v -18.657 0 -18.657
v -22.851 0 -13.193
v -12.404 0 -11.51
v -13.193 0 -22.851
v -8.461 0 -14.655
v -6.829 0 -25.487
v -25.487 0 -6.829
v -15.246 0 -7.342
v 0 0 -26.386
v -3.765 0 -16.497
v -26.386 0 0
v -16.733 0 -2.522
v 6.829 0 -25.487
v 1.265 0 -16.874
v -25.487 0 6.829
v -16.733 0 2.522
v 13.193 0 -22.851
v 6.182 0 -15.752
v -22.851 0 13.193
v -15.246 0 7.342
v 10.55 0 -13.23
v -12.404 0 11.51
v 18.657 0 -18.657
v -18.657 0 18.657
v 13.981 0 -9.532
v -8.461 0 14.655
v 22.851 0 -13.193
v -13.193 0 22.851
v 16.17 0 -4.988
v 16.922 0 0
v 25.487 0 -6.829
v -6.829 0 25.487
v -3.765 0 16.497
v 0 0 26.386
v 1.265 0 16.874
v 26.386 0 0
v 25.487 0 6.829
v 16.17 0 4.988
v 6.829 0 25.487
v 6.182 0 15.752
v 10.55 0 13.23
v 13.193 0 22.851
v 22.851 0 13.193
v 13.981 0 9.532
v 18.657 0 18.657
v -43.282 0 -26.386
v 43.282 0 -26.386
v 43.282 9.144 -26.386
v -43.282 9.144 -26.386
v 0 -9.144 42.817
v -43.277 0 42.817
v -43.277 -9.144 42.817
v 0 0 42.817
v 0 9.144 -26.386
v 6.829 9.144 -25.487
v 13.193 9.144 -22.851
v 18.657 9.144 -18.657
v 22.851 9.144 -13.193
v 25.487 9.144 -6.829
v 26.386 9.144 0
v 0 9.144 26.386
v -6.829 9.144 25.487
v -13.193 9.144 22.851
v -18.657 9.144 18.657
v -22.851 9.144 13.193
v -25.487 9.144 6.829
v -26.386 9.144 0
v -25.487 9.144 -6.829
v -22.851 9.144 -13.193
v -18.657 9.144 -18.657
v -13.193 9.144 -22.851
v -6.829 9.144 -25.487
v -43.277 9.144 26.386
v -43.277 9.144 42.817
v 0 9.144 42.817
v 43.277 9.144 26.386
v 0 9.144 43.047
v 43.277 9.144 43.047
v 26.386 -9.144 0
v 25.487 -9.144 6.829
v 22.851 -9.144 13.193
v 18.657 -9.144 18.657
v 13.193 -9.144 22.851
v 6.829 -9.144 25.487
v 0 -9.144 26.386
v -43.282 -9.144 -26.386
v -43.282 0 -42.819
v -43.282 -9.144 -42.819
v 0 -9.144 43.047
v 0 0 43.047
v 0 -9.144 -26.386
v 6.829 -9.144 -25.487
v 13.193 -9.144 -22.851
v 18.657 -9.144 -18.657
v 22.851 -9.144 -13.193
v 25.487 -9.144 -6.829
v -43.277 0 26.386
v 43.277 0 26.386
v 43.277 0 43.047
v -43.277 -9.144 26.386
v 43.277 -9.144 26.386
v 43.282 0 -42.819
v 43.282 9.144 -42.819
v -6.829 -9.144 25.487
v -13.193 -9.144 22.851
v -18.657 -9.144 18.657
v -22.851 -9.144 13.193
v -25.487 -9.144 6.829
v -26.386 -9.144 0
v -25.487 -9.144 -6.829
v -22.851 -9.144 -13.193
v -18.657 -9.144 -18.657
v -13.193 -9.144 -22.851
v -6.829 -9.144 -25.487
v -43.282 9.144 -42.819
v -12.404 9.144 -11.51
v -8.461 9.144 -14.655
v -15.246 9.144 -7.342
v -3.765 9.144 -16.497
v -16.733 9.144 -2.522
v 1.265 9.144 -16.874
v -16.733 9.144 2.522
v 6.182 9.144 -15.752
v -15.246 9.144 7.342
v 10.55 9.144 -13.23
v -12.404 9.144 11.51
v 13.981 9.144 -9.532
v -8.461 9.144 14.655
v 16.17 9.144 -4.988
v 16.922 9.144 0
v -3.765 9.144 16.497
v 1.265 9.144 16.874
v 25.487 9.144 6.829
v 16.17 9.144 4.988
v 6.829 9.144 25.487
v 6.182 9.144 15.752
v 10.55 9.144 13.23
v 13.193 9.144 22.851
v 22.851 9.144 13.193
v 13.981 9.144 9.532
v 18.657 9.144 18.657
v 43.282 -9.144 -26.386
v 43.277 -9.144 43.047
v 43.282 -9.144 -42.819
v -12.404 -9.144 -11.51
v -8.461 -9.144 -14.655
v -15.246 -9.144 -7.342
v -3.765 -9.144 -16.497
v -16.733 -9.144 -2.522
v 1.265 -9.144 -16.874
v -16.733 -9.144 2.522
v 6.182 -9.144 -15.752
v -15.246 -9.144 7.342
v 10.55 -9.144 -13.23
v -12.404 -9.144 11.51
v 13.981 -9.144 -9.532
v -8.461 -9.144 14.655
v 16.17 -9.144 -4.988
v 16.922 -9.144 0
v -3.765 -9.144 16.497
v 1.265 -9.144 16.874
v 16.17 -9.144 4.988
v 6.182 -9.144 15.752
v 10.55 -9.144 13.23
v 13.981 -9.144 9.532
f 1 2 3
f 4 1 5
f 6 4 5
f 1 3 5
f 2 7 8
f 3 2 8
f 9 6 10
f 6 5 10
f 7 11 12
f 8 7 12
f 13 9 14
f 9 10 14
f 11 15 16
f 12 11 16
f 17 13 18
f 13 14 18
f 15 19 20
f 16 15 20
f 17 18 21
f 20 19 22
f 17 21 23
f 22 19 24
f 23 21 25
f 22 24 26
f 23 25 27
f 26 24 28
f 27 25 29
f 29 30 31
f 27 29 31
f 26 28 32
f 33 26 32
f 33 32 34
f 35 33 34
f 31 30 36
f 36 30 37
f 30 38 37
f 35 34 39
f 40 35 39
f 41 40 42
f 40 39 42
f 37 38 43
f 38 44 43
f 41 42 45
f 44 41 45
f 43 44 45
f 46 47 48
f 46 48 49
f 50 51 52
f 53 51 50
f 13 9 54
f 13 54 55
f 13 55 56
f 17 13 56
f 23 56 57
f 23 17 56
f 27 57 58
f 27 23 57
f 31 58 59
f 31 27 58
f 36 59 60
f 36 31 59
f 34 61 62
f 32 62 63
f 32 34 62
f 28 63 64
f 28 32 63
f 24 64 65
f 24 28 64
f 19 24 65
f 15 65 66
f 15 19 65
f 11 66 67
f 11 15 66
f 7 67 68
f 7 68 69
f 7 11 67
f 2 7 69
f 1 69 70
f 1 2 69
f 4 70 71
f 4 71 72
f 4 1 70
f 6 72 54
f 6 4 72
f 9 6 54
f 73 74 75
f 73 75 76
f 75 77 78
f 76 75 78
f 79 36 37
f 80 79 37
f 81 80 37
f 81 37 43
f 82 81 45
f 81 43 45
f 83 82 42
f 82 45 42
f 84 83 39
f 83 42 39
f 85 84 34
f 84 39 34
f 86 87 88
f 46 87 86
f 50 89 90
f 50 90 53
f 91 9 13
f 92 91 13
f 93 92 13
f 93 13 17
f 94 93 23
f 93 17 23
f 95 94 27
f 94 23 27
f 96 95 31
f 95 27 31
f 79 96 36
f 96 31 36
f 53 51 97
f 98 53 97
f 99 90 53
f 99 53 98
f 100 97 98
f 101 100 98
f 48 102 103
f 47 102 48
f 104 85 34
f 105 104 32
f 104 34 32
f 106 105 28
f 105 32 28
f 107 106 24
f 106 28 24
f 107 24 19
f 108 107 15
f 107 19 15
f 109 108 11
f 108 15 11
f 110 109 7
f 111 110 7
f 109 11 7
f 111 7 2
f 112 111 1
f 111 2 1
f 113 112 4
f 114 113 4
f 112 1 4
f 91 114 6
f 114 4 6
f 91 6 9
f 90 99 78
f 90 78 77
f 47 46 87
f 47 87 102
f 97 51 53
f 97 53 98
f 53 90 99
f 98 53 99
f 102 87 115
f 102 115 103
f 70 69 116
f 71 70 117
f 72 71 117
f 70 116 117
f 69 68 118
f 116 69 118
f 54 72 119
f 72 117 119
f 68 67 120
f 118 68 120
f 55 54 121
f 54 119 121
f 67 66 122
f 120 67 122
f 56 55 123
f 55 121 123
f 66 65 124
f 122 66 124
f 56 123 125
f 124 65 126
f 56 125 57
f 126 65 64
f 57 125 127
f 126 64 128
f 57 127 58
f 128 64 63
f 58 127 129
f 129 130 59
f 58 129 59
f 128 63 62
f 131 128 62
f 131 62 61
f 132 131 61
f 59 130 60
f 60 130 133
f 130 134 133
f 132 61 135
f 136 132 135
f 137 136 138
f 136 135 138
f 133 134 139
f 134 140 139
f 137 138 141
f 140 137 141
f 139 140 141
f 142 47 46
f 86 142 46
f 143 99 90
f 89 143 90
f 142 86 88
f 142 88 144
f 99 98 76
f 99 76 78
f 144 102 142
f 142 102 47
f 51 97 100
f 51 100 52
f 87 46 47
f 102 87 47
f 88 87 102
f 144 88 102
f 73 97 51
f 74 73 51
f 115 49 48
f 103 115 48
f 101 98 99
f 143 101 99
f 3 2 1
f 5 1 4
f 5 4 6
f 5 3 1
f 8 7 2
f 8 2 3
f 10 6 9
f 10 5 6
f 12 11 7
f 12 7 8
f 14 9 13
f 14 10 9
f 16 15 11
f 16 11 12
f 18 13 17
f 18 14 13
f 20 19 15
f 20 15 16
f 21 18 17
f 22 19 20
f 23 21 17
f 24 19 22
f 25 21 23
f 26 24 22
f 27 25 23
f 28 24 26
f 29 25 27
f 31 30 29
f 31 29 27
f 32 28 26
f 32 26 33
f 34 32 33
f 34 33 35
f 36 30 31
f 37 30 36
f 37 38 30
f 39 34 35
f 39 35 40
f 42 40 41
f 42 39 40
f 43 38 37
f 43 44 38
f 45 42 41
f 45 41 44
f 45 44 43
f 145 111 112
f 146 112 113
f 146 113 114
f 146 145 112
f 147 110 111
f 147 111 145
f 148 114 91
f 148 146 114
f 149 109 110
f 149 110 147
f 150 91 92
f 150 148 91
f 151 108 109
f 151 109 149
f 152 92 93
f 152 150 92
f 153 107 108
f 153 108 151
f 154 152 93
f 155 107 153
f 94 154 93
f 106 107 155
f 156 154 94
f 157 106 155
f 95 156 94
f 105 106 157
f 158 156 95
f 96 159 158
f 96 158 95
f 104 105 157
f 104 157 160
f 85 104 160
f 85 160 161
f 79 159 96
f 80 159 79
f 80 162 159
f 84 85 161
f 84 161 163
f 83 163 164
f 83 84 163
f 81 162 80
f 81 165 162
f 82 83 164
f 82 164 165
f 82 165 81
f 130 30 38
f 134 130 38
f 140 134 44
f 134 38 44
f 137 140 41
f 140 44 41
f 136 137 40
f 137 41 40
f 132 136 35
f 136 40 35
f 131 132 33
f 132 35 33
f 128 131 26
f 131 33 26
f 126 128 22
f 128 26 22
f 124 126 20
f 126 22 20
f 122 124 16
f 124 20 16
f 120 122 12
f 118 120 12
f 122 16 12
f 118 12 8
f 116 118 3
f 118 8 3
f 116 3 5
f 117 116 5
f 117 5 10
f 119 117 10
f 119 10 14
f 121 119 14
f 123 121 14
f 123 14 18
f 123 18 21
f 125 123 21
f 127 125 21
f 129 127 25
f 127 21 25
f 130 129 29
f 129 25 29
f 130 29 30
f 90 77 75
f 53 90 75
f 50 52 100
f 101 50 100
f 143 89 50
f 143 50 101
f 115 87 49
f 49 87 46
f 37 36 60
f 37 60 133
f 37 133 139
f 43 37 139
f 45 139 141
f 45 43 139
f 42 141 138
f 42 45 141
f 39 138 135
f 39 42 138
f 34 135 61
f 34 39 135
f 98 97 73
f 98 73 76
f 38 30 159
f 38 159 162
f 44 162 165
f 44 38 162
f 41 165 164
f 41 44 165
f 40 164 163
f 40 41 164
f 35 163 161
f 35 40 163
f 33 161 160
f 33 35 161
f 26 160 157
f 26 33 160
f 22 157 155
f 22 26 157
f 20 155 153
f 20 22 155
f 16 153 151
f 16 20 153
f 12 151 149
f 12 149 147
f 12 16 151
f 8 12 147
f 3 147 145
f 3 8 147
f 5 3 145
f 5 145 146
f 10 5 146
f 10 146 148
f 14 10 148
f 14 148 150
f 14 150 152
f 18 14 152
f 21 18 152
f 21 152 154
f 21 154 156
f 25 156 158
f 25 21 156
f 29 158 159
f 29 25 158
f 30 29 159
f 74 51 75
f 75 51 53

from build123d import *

# Parameters (mm, degrees)
F0_R     = 16.9215961021
F1_DEPTH = 9.144
F0_W     = 43.2765670121
F0_H     = 16.4317270167
F0_W_2   = 43.2816
F0_H_2   = 16.4338
F2_DEPTH = 9.144


with BuildPart() as f1:
    # F0 (on Front) → F1 (new body)
    with BuildSketch(Plane.XZ):
        with BuildLine():
            ThreePointArc((0, -26.3856756144), (18.6574901531, -18.6574901531), (26.3856756144, 0))
            ThreePointArc((26.3856756144, 0), (18.6574901531, 18.6574901531), (0, 26.3856756144))
            ThreePointArc((0, 26.3856756144), (-26.3856756144, 0), (0, -26.3856756144))
        make_face()
        Circle(F0_R, mode=Mode.SUBTRACT)
    extrude(amount=F1_DEPTH)


with BuildPart() as f1b:
    # F0 (on Front) → F1, piece 2 (new body)
    with BuildSketch(Plane.XZ):
        with Locations((-21.638283506, 34.6015391227)):
            Rectangle(F0_W, F0_H)
        Polygon((0, 42.817402631), (0, 26.3856756144), (43.2765781879, 26.3856756144), (43.2765781879, 43.0469885468), (0, 43.0469885468), align=None)
    extrude(amount=F1_DEPTH)


with BuildPart() as f1c:
    # F0 (on Front) → F1, piece 3 (new body)
    with BuildSketch(Plane.XZ):
        with Locations((-21.6408, -34.6025756144)):
            Rectangle(F0_W_2, F0_H_2)
        with Locations((21.6408, -34.6025756144)):
            Rectangle(F0_W_2, F0_H_2)
    extrude(amount=F1_DEPTH)


with BuildPart() as f2:
    # F2 (new): a face of the model
    f2_faces = [f1.part.faces().sort_by_distance(p)[0] for p in [
        (-25.6393760083, 0, 0),
    ]]
    extrude(f2_faces, amount=F2_DEPTH)


with BuildPart() as f2b:
    # F2#2 (new): a face of the model
    f2_2_faces = [f1c.part.faces().sort_by_distance(p)[0] for p in [
        (0, 0, -34.6025756144),
    ]]
    extrude(f2_2_faces, amount=F2_DEPTH)


with BuildPart() as f2c:
    # F2#3 (new): a face of the model
    f2_3_faces = [f1b.part.faces().sort_by_distance(p)[0] for p in [
        (0.1501231287, 0, 34.6593338023),
    ]]
    extrude(f2_3_faces, amount=F2_DEPTH)


solid = Compound([f1.part, f1b.part, f1c.part, f2.part, f2b.part, f2c.part])
